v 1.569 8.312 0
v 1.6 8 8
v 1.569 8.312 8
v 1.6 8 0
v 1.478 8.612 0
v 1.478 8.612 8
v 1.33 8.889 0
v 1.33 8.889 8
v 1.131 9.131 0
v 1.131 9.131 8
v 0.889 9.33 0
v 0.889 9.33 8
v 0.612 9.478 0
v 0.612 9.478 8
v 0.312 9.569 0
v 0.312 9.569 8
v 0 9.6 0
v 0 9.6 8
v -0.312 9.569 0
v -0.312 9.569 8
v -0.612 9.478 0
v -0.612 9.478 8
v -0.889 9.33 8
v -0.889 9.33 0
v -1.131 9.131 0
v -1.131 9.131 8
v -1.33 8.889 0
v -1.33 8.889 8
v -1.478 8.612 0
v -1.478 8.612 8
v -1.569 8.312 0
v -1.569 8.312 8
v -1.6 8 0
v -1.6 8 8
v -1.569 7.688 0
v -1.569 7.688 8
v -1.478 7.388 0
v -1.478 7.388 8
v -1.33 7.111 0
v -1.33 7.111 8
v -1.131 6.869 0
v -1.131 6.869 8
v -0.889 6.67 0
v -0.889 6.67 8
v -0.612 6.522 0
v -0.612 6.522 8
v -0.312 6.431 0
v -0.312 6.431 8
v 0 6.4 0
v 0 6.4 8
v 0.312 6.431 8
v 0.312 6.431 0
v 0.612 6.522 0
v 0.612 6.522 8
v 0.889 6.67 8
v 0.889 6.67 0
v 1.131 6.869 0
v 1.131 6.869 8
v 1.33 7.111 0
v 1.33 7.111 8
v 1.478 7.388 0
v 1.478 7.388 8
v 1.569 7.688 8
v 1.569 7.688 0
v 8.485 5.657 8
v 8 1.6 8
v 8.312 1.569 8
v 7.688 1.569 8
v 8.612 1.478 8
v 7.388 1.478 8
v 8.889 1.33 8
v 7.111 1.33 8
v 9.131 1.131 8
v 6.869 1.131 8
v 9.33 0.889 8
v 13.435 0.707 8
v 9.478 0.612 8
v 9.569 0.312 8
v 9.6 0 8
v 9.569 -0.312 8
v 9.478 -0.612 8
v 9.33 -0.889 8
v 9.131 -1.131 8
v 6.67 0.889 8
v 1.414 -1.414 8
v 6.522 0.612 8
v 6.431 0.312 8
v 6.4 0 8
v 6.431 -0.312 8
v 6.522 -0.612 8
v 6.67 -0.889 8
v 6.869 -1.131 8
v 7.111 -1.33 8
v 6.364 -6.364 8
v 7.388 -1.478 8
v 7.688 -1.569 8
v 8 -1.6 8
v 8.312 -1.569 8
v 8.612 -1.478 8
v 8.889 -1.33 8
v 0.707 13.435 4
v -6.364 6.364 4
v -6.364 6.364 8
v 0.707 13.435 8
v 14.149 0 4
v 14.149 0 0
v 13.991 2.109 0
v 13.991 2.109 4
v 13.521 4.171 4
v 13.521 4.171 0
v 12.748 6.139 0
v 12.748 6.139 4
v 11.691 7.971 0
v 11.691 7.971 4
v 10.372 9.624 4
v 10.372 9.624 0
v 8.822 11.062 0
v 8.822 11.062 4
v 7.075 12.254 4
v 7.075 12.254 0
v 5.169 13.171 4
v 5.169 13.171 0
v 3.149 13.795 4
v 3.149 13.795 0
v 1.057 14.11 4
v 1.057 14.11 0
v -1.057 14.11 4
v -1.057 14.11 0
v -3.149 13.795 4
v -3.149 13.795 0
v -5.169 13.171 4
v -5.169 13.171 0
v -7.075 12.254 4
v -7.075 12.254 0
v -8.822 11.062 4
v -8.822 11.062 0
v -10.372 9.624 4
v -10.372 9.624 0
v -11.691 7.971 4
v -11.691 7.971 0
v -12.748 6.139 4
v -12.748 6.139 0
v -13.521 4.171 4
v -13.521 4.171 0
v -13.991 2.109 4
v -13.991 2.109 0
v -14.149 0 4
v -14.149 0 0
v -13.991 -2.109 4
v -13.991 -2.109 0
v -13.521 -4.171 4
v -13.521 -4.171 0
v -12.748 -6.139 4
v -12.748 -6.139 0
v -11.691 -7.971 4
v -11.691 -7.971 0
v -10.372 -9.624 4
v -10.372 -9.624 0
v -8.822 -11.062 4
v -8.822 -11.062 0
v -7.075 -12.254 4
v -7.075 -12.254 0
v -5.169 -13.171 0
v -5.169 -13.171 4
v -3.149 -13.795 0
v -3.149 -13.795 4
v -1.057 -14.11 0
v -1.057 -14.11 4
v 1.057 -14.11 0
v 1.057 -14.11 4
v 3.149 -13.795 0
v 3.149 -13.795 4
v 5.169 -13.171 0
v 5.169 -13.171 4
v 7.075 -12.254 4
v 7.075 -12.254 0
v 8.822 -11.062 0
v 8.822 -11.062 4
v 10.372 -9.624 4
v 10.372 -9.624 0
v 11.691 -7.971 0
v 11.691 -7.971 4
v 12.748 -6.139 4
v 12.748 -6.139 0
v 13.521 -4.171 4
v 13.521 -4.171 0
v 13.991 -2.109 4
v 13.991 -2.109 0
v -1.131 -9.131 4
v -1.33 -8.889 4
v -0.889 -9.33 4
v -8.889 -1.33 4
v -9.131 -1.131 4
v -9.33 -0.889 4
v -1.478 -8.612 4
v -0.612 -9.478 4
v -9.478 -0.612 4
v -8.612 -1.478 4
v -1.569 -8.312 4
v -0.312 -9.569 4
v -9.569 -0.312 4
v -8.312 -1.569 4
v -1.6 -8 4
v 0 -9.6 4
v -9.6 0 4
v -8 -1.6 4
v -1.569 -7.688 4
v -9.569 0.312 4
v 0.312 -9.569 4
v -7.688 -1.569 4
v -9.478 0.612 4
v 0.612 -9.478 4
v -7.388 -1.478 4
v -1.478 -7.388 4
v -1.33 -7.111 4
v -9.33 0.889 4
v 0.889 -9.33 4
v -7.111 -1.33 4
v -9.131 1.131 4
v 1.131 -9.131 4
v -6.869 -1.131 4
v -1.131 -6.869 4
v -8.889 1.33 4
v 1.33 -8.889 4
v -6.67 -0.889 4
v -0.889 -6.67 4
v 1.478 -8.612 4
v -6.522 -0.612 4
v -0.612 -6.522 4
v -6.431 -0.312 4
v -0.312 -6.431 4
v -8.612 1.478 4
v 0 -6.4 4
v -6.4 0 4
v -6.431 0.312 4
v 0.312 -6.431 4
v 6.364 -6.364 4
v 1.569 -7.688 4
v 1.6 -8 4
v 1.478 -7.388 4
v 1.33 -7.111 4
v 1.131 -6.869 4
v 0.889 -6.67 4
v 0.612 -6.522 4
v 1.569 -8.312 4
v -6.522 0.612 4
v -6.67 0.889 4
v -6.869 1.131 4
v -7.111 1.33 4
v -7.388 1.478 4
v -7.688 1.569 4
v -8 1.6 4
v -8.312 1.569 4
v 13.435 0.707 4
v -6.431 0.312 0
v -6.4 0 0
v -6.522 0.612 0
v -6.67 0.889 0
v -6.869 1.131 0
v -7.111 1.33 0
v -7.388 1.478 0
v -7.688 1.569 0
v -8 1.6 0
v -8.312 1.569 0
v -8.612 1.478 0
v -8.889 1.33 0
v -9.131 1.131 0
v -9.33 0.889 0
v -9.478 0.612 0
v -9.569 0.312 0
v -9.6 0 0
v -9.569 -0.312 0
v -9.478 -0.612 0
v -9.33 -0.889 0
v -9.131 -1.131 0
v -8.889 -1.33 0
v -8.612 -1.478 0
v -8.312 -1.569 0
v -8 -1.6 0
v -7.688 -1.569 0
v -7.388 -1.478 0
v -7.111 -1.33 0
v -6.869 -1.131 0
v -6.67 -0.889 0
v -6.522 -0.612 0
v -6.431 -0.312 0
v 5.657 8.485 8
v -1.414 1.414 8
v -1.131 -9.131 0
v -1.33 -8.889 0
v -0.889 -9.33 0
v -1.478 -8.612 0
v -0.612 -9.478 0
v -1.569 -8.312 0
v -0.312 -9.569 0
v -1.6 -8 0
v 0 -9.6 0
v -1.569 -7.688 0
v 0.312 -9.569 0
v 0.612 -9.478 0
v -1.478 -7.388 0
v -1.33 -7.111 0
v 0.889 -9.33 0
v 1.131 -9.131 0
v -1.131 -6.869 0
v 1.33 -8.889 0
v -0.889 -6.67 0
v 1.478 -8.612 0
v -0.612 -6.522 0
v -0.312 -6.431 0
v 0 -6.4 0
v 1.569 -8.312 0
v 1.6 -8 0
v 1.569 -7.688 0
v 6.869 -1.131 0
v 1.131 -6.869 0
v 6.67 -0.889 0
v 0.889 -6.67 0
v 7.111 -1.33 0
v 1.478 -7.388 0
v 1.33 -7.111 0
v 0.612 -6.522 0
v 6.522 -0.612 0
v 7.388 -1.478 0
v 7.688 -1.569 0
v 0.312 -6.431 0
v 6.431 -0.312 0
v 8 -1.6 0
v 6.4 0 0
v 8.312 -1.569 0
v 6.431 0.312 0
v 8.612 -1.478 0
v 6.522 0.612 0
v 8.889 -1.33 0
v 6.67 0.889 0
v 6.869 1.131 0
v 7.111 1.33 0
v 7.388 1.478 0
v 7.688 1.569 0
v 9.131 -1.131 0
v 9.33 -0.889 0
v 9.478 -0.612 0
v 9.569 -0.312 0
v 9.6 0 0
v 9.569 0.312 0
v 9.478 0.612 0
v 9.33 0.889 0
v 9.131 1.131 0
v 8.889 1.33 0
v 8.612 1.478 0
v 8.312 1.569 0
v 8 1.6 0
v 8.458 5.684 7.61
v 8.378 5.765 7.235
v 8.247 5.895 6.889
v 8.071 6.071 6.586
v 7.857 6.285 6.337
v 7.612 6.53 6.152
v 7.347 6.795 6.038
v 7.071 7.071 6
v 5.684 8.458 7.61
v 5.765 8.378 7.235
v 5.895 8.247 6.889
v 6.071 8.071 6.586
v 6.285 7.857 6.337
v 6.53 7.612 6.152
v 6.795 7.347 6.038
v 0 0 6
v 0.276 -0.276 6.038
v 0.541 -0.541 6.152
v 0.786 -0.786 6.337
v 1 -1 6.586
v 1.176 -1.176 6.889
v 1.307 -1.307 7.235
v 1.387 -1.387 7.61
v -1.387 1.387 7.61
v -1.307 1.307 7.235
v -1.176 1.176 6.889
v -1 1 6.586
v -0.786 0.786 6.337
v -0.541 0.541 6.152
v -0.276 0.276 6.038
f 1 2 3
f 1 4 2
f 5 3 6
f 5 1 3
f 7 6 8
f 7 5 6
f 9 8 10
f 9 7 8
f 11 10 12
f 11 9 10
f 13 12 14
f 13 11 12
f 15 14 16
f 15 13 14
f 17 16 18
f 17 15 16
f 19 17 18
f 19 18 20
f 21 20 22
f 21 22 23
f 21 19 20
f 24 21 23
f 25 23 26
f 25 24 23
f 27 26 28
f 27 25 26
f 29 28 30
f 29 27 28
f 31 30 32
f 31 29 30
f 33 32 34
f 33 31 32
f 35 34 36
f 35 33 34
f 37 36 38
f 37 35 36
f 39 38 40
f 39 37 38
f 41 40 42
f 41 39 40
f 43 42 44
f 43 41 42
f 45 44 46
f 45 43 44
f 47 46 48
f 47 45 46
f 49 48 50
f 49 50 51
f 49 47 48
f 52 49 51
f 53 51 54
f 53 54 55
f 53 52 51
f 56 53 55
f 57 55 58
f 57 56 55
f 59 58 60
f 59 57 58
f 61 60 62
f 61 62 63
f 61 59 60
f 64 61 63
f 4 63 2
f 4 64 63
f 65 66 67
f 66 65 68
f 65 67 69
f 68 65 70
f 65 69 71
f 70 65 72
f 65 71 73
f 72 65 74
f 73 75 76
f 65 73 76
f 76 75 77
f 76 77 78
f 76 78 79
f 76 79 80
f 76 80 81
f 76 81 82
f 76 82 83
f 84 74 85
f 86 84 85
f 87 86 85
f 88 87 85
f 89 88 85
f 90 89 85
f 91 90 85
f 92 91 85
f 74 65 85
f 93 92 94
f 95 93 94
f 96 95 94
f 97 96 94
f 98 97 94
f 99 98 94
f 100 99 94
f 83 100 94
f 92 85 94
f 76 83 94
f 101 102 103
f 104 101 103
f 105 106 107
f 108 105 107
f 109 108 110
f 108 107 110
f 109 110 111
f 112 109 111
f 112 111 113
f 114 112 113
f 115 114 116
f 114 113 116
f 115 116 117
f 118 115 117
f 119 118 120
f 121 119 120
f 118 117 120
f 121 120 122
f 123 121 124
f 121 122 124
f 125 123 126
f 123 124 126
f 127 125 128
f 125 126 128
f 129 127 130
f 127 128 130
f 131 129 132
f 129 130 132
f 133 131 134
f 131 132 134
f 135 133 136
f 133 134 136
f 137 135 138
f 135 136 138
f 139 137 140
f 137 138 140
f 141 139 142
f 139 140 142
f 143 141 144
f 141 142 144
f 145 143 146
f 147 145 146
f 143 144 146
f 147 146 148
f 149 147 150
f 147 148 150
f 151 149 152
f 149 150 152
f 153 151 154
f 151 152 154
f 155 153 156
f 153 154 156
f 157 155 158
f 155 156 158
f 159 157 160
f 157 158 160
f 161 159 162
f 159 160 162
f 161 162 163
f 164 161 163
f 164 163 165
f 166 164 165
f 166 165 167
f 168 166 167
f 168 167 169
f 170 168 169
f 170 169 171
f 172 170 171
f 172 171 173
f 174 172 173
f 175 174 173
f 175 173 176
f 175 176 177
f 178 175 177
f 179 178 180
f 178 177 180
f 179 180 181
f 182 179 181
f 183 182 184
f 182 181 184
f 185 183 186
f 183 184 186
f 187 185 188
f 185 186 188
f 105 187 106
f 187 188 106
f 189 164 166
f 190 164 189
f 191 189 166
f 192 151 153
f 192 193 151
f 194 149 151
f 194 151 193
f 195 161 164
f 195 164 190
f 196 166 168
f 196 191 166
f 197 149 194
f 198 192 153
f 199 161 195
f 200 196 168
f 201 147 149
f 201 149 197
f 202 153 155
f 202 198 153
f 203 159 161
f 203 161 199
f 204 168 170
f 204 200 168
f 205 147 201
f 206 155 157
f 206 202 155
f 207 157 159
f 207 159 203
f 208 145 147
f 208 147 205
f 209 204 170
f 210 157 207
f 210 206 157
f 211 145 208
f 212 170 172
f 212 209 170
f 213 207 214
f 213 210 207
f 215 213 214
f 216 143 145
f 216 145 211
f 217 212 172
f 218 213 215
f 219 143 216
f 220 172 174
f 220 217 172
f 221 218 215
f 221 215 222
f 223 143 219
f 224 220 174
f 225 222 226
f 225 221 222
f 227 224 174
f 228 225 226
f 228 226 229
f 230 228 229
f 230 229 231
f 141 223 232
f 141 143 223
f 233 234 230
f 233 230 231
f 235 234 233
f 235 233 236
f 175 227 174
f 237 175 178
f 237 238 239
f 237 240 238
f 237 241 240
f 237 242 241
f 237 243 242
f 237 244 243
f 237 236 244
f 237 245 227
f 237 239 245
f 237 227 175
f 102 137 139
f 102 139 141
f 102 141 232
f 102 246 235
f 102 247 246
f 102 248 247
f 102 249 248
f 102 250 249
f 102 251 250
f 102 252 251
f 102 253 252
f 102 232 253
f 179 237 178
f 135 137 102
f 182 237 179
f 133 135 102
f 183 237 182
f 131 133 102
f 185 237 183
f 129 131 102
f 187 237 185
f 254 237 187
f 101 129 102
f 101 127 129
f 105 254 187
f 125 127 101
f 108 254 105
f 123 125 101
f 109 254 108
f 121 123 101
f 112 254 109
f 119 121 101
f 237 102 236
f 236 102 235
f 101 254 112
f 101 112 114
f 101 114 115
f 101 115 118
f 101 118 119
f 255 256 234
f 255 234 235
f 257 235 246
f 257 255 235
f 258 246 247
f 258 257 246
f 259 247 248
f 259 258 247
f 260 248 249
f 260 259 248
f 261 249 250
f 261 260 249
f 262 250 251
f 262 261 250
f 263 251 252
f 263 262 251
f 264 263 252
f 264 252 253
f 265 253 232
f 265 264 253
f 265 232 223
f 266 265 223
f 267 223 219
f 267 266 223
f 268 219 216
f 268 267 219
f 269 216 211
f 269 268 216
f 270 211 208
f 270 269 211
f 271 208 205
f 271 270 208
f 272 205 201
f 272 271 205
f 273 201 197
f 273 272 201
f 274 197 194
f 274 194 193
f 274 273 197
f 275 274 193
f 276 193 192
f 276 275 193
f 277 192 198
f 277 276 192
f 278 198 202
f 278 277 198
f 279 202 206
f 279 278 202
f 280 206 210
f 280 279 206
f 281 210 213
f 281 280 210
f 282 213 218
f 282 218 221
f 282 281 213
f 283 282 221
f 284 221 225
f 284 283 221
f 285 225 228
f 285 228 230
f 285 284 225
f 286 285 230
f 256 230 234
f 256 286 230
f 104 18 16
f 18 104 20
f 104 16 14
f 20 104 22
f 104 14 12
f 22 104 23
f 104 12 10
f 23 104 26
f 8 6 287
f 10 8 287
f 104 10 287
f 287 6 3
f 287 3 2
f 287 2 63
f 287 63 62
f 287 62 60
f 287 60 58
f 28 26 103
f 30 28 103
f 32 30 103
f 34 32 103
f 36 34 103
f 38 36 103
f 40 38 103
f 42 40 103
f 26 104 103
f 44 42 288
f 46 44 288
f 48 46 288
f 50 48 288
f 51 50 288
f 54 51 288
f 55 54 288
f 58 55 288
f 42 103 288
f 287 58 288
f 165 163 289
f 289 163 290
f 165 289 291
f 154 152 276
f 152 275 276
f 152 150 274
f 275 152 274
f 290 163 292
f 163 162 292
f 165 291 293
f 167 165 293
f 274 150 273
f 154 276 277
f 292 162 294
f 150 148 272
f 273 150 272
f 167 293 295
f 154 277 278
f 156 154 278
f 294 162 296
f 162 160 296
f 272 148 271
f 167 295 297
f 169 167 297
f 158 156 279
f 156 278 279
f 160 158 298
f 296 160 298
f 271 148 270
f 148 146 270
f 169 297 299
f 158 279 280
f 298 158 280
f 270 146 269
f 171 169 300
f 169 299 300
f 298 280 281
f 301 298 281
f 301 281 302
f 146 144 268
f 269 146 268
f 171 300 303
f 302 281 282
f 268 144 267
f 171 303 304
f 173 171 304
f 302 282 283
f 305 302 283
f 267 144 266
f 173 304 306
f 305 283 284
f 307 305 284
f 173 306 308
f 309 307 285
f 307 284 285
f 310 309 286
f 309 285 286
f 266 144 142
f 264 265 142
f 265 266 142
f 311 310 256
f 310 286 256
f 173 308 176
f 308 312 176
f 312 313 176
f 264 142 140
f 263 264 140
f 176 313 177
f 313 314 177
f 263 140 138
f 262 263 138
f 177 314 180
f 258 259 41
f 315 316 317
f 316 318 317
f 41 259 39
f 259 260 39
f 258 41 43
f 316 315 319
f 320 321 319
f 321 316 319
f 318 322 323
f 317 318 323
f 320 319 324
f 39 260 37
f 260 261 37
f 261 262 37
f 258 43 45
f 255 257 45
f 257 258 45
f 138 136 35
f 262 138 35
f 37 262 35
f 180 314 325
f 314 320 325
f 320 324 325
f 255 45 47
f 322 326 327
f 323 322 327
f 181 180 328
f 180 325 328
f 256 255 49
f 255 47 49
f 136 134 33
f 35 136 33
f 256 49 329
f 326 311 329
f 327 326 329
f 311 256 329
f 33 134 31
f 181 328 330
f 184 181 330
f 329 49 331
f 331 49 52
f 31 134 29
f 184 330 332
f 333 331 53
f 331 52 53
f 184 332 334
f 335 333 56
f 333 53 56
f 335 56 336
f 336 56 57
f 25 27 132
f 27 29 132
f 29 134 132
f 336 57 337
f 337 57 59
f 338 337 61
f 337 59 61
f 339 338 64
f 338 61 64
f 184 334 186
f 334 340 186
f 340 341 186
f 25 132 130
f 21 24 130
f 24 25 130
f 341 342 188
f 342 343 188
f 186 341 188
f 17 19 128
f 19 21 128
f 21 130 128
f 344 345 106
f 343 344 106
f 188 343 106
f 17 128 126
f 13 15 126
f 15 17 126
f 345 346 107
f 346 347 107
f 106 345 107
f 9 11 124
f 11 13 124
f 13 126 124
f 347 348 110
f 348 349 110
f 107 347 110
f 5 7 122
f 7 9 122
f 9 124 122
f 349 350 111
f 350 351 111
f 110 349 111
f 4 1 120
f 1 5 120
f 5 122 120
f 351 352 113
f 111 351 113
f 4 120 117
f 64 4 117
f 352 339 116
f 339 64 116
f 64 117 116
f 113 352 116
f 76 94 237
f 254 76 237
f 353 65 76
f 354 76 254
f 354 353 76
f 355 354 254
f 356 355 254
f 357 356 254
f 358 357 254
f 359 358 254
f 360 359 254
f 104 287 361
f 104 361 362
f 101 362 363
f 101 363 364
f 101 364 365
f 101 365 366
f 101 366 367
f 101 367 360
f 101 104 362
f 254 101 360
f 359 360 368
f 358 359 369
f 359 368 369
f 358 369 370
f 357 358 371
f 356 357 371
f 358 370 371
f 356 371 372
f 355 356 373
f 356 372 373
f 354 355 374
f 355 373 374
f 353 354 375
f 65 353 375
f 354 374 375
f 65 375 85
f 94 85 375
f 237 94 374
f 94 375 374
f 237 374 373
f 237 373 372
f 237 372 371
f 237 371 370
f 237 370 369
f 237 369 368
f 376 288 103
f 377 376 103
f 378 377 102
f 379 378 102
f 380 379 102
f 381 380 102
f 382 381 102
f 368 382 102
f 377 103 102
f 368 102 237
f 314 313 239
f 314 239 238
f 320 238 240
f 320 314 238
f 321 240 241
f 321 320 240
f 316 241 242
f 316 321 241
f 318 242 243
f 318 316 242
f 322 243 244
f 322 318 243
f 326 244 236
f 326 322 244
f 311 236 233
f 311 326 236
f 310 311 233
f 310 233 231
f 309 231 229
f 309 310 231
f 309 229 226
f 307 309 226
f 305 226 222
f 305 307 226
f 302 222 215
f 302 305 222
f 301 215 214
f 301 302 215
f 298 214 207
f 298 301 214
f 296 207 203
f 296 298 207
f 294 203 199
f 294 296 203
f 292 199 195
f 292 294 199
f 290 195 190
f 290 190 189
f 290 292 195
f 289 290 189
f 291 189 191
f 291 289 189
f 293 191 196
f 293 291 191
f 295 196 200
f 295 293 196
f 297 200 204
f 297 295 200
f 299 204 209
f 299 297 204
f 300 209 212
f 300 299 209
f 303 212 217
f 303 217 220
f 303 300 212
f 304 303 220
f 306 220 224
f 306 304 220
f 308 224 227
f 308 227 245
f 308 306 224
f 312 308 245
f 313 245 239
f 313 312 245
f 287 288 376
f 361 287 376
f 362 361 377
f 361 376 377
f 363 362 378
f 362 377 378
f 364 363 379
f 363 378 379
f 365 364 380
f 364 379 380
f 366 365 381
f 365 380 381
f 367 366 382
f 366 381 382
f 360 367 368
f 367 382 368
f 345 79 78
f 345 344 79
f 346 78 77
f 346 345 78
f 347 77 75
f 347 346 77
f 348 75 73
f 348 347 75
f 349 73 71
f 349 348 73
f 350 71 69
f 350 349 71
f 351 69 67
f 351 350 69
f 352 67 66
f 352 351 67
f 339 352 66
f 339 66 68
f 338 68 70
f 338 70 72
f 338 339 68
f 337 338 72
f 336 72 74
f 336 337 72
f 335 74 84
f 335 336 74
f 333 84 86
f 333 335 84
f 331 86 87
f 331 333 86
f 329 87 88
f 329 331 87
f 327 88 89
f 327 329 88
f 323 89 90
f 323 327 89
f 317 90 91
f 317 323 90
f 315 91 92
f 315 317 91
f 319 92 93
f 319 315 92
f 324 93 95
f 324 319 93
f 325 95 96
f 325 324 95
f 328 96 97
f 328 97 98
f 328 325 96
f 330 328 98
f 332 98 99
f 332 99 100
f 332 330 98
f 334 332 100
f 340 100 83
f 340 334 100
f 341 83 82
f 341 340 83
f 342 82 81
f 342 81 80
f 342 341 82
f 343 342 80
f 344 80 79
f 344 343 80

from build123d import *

# Parameters (mm, degrees)
SKETCH_1_R          = 14.149308539
SKETCH_1_R_2        = 1.6
EXTRUDE_1_DEPTH     = 4
EXTRUDE_2_DEPTH     = 10
CUT_EXTRUDE_START   = -10
SKETCH_4_R          = 1.6
CUT_EXTRUDE_1_DEPTH = 10


with BuildPart() as part:
    # 草图1 → 凸台-拉伸1 (new body)
    with BuildSketch(Plane.XY):
        Circle(SKETCH_1_R)
        with Locations((0, -8)):
            Circle(SKETCH_1_R_2, mode=Mode.SUBTRACT)
        with Locations((8, 0)):
            Circle(SKETCH_1_R_2, mode=Mode.SUBTRACT)
        with Locations((0, 8)):
            Circle(SKETCH_1_R_2, mode=Mode.SUBTRACT)
        with Locations((-8, 0)):
            Circle(SKETCH_1_R_2, mode=Mode.SUBTRACT)
    extrude(amount=EXTRUDE_1_DEPTH)

    # 草图3 → 凸台-拉伸2 (add)
    with BuildSketch(Plane(origin=(0, 0, 0), x_dir=(0, 0, -1), z_dir=(0.7071067811865488, 0.7071067811865464, 0))):
        with BuildLine():
            Line((-8, 9), (-8, 2))
            ThreePointArc((-8, 2), (-6.585786438, 1.414213562), (-6, 0))
            ThreePointArc((-6, 0), (-6.585786438, -1.414213562), (-8, -2))
            Line((-8, -2), (-8, -9))
            Line((-8, -9), (-4, -9))
            Line((-4, -9), (-4, 9))
            Line((-4, 9), (-8, 9))
        make_face()
    extrude(amount=EXTRUDE_2_DEPTH)

    # 草图4 → 切除-拉伸1 (cut)
    with BuildSketch(Plane.XY.offset(8).offset(CUT_EXTRUDE_START)):
        with Locations((8, 0)):
            Circle(SKETCH_4_R)
        with Locations((0, 8)):
            Circle(SKETCH_4_R)
    extrude(amount=CUT_EXTRUDE_1_DEPTH, mode=Mode.SUBTRACT)


solid = part.part
